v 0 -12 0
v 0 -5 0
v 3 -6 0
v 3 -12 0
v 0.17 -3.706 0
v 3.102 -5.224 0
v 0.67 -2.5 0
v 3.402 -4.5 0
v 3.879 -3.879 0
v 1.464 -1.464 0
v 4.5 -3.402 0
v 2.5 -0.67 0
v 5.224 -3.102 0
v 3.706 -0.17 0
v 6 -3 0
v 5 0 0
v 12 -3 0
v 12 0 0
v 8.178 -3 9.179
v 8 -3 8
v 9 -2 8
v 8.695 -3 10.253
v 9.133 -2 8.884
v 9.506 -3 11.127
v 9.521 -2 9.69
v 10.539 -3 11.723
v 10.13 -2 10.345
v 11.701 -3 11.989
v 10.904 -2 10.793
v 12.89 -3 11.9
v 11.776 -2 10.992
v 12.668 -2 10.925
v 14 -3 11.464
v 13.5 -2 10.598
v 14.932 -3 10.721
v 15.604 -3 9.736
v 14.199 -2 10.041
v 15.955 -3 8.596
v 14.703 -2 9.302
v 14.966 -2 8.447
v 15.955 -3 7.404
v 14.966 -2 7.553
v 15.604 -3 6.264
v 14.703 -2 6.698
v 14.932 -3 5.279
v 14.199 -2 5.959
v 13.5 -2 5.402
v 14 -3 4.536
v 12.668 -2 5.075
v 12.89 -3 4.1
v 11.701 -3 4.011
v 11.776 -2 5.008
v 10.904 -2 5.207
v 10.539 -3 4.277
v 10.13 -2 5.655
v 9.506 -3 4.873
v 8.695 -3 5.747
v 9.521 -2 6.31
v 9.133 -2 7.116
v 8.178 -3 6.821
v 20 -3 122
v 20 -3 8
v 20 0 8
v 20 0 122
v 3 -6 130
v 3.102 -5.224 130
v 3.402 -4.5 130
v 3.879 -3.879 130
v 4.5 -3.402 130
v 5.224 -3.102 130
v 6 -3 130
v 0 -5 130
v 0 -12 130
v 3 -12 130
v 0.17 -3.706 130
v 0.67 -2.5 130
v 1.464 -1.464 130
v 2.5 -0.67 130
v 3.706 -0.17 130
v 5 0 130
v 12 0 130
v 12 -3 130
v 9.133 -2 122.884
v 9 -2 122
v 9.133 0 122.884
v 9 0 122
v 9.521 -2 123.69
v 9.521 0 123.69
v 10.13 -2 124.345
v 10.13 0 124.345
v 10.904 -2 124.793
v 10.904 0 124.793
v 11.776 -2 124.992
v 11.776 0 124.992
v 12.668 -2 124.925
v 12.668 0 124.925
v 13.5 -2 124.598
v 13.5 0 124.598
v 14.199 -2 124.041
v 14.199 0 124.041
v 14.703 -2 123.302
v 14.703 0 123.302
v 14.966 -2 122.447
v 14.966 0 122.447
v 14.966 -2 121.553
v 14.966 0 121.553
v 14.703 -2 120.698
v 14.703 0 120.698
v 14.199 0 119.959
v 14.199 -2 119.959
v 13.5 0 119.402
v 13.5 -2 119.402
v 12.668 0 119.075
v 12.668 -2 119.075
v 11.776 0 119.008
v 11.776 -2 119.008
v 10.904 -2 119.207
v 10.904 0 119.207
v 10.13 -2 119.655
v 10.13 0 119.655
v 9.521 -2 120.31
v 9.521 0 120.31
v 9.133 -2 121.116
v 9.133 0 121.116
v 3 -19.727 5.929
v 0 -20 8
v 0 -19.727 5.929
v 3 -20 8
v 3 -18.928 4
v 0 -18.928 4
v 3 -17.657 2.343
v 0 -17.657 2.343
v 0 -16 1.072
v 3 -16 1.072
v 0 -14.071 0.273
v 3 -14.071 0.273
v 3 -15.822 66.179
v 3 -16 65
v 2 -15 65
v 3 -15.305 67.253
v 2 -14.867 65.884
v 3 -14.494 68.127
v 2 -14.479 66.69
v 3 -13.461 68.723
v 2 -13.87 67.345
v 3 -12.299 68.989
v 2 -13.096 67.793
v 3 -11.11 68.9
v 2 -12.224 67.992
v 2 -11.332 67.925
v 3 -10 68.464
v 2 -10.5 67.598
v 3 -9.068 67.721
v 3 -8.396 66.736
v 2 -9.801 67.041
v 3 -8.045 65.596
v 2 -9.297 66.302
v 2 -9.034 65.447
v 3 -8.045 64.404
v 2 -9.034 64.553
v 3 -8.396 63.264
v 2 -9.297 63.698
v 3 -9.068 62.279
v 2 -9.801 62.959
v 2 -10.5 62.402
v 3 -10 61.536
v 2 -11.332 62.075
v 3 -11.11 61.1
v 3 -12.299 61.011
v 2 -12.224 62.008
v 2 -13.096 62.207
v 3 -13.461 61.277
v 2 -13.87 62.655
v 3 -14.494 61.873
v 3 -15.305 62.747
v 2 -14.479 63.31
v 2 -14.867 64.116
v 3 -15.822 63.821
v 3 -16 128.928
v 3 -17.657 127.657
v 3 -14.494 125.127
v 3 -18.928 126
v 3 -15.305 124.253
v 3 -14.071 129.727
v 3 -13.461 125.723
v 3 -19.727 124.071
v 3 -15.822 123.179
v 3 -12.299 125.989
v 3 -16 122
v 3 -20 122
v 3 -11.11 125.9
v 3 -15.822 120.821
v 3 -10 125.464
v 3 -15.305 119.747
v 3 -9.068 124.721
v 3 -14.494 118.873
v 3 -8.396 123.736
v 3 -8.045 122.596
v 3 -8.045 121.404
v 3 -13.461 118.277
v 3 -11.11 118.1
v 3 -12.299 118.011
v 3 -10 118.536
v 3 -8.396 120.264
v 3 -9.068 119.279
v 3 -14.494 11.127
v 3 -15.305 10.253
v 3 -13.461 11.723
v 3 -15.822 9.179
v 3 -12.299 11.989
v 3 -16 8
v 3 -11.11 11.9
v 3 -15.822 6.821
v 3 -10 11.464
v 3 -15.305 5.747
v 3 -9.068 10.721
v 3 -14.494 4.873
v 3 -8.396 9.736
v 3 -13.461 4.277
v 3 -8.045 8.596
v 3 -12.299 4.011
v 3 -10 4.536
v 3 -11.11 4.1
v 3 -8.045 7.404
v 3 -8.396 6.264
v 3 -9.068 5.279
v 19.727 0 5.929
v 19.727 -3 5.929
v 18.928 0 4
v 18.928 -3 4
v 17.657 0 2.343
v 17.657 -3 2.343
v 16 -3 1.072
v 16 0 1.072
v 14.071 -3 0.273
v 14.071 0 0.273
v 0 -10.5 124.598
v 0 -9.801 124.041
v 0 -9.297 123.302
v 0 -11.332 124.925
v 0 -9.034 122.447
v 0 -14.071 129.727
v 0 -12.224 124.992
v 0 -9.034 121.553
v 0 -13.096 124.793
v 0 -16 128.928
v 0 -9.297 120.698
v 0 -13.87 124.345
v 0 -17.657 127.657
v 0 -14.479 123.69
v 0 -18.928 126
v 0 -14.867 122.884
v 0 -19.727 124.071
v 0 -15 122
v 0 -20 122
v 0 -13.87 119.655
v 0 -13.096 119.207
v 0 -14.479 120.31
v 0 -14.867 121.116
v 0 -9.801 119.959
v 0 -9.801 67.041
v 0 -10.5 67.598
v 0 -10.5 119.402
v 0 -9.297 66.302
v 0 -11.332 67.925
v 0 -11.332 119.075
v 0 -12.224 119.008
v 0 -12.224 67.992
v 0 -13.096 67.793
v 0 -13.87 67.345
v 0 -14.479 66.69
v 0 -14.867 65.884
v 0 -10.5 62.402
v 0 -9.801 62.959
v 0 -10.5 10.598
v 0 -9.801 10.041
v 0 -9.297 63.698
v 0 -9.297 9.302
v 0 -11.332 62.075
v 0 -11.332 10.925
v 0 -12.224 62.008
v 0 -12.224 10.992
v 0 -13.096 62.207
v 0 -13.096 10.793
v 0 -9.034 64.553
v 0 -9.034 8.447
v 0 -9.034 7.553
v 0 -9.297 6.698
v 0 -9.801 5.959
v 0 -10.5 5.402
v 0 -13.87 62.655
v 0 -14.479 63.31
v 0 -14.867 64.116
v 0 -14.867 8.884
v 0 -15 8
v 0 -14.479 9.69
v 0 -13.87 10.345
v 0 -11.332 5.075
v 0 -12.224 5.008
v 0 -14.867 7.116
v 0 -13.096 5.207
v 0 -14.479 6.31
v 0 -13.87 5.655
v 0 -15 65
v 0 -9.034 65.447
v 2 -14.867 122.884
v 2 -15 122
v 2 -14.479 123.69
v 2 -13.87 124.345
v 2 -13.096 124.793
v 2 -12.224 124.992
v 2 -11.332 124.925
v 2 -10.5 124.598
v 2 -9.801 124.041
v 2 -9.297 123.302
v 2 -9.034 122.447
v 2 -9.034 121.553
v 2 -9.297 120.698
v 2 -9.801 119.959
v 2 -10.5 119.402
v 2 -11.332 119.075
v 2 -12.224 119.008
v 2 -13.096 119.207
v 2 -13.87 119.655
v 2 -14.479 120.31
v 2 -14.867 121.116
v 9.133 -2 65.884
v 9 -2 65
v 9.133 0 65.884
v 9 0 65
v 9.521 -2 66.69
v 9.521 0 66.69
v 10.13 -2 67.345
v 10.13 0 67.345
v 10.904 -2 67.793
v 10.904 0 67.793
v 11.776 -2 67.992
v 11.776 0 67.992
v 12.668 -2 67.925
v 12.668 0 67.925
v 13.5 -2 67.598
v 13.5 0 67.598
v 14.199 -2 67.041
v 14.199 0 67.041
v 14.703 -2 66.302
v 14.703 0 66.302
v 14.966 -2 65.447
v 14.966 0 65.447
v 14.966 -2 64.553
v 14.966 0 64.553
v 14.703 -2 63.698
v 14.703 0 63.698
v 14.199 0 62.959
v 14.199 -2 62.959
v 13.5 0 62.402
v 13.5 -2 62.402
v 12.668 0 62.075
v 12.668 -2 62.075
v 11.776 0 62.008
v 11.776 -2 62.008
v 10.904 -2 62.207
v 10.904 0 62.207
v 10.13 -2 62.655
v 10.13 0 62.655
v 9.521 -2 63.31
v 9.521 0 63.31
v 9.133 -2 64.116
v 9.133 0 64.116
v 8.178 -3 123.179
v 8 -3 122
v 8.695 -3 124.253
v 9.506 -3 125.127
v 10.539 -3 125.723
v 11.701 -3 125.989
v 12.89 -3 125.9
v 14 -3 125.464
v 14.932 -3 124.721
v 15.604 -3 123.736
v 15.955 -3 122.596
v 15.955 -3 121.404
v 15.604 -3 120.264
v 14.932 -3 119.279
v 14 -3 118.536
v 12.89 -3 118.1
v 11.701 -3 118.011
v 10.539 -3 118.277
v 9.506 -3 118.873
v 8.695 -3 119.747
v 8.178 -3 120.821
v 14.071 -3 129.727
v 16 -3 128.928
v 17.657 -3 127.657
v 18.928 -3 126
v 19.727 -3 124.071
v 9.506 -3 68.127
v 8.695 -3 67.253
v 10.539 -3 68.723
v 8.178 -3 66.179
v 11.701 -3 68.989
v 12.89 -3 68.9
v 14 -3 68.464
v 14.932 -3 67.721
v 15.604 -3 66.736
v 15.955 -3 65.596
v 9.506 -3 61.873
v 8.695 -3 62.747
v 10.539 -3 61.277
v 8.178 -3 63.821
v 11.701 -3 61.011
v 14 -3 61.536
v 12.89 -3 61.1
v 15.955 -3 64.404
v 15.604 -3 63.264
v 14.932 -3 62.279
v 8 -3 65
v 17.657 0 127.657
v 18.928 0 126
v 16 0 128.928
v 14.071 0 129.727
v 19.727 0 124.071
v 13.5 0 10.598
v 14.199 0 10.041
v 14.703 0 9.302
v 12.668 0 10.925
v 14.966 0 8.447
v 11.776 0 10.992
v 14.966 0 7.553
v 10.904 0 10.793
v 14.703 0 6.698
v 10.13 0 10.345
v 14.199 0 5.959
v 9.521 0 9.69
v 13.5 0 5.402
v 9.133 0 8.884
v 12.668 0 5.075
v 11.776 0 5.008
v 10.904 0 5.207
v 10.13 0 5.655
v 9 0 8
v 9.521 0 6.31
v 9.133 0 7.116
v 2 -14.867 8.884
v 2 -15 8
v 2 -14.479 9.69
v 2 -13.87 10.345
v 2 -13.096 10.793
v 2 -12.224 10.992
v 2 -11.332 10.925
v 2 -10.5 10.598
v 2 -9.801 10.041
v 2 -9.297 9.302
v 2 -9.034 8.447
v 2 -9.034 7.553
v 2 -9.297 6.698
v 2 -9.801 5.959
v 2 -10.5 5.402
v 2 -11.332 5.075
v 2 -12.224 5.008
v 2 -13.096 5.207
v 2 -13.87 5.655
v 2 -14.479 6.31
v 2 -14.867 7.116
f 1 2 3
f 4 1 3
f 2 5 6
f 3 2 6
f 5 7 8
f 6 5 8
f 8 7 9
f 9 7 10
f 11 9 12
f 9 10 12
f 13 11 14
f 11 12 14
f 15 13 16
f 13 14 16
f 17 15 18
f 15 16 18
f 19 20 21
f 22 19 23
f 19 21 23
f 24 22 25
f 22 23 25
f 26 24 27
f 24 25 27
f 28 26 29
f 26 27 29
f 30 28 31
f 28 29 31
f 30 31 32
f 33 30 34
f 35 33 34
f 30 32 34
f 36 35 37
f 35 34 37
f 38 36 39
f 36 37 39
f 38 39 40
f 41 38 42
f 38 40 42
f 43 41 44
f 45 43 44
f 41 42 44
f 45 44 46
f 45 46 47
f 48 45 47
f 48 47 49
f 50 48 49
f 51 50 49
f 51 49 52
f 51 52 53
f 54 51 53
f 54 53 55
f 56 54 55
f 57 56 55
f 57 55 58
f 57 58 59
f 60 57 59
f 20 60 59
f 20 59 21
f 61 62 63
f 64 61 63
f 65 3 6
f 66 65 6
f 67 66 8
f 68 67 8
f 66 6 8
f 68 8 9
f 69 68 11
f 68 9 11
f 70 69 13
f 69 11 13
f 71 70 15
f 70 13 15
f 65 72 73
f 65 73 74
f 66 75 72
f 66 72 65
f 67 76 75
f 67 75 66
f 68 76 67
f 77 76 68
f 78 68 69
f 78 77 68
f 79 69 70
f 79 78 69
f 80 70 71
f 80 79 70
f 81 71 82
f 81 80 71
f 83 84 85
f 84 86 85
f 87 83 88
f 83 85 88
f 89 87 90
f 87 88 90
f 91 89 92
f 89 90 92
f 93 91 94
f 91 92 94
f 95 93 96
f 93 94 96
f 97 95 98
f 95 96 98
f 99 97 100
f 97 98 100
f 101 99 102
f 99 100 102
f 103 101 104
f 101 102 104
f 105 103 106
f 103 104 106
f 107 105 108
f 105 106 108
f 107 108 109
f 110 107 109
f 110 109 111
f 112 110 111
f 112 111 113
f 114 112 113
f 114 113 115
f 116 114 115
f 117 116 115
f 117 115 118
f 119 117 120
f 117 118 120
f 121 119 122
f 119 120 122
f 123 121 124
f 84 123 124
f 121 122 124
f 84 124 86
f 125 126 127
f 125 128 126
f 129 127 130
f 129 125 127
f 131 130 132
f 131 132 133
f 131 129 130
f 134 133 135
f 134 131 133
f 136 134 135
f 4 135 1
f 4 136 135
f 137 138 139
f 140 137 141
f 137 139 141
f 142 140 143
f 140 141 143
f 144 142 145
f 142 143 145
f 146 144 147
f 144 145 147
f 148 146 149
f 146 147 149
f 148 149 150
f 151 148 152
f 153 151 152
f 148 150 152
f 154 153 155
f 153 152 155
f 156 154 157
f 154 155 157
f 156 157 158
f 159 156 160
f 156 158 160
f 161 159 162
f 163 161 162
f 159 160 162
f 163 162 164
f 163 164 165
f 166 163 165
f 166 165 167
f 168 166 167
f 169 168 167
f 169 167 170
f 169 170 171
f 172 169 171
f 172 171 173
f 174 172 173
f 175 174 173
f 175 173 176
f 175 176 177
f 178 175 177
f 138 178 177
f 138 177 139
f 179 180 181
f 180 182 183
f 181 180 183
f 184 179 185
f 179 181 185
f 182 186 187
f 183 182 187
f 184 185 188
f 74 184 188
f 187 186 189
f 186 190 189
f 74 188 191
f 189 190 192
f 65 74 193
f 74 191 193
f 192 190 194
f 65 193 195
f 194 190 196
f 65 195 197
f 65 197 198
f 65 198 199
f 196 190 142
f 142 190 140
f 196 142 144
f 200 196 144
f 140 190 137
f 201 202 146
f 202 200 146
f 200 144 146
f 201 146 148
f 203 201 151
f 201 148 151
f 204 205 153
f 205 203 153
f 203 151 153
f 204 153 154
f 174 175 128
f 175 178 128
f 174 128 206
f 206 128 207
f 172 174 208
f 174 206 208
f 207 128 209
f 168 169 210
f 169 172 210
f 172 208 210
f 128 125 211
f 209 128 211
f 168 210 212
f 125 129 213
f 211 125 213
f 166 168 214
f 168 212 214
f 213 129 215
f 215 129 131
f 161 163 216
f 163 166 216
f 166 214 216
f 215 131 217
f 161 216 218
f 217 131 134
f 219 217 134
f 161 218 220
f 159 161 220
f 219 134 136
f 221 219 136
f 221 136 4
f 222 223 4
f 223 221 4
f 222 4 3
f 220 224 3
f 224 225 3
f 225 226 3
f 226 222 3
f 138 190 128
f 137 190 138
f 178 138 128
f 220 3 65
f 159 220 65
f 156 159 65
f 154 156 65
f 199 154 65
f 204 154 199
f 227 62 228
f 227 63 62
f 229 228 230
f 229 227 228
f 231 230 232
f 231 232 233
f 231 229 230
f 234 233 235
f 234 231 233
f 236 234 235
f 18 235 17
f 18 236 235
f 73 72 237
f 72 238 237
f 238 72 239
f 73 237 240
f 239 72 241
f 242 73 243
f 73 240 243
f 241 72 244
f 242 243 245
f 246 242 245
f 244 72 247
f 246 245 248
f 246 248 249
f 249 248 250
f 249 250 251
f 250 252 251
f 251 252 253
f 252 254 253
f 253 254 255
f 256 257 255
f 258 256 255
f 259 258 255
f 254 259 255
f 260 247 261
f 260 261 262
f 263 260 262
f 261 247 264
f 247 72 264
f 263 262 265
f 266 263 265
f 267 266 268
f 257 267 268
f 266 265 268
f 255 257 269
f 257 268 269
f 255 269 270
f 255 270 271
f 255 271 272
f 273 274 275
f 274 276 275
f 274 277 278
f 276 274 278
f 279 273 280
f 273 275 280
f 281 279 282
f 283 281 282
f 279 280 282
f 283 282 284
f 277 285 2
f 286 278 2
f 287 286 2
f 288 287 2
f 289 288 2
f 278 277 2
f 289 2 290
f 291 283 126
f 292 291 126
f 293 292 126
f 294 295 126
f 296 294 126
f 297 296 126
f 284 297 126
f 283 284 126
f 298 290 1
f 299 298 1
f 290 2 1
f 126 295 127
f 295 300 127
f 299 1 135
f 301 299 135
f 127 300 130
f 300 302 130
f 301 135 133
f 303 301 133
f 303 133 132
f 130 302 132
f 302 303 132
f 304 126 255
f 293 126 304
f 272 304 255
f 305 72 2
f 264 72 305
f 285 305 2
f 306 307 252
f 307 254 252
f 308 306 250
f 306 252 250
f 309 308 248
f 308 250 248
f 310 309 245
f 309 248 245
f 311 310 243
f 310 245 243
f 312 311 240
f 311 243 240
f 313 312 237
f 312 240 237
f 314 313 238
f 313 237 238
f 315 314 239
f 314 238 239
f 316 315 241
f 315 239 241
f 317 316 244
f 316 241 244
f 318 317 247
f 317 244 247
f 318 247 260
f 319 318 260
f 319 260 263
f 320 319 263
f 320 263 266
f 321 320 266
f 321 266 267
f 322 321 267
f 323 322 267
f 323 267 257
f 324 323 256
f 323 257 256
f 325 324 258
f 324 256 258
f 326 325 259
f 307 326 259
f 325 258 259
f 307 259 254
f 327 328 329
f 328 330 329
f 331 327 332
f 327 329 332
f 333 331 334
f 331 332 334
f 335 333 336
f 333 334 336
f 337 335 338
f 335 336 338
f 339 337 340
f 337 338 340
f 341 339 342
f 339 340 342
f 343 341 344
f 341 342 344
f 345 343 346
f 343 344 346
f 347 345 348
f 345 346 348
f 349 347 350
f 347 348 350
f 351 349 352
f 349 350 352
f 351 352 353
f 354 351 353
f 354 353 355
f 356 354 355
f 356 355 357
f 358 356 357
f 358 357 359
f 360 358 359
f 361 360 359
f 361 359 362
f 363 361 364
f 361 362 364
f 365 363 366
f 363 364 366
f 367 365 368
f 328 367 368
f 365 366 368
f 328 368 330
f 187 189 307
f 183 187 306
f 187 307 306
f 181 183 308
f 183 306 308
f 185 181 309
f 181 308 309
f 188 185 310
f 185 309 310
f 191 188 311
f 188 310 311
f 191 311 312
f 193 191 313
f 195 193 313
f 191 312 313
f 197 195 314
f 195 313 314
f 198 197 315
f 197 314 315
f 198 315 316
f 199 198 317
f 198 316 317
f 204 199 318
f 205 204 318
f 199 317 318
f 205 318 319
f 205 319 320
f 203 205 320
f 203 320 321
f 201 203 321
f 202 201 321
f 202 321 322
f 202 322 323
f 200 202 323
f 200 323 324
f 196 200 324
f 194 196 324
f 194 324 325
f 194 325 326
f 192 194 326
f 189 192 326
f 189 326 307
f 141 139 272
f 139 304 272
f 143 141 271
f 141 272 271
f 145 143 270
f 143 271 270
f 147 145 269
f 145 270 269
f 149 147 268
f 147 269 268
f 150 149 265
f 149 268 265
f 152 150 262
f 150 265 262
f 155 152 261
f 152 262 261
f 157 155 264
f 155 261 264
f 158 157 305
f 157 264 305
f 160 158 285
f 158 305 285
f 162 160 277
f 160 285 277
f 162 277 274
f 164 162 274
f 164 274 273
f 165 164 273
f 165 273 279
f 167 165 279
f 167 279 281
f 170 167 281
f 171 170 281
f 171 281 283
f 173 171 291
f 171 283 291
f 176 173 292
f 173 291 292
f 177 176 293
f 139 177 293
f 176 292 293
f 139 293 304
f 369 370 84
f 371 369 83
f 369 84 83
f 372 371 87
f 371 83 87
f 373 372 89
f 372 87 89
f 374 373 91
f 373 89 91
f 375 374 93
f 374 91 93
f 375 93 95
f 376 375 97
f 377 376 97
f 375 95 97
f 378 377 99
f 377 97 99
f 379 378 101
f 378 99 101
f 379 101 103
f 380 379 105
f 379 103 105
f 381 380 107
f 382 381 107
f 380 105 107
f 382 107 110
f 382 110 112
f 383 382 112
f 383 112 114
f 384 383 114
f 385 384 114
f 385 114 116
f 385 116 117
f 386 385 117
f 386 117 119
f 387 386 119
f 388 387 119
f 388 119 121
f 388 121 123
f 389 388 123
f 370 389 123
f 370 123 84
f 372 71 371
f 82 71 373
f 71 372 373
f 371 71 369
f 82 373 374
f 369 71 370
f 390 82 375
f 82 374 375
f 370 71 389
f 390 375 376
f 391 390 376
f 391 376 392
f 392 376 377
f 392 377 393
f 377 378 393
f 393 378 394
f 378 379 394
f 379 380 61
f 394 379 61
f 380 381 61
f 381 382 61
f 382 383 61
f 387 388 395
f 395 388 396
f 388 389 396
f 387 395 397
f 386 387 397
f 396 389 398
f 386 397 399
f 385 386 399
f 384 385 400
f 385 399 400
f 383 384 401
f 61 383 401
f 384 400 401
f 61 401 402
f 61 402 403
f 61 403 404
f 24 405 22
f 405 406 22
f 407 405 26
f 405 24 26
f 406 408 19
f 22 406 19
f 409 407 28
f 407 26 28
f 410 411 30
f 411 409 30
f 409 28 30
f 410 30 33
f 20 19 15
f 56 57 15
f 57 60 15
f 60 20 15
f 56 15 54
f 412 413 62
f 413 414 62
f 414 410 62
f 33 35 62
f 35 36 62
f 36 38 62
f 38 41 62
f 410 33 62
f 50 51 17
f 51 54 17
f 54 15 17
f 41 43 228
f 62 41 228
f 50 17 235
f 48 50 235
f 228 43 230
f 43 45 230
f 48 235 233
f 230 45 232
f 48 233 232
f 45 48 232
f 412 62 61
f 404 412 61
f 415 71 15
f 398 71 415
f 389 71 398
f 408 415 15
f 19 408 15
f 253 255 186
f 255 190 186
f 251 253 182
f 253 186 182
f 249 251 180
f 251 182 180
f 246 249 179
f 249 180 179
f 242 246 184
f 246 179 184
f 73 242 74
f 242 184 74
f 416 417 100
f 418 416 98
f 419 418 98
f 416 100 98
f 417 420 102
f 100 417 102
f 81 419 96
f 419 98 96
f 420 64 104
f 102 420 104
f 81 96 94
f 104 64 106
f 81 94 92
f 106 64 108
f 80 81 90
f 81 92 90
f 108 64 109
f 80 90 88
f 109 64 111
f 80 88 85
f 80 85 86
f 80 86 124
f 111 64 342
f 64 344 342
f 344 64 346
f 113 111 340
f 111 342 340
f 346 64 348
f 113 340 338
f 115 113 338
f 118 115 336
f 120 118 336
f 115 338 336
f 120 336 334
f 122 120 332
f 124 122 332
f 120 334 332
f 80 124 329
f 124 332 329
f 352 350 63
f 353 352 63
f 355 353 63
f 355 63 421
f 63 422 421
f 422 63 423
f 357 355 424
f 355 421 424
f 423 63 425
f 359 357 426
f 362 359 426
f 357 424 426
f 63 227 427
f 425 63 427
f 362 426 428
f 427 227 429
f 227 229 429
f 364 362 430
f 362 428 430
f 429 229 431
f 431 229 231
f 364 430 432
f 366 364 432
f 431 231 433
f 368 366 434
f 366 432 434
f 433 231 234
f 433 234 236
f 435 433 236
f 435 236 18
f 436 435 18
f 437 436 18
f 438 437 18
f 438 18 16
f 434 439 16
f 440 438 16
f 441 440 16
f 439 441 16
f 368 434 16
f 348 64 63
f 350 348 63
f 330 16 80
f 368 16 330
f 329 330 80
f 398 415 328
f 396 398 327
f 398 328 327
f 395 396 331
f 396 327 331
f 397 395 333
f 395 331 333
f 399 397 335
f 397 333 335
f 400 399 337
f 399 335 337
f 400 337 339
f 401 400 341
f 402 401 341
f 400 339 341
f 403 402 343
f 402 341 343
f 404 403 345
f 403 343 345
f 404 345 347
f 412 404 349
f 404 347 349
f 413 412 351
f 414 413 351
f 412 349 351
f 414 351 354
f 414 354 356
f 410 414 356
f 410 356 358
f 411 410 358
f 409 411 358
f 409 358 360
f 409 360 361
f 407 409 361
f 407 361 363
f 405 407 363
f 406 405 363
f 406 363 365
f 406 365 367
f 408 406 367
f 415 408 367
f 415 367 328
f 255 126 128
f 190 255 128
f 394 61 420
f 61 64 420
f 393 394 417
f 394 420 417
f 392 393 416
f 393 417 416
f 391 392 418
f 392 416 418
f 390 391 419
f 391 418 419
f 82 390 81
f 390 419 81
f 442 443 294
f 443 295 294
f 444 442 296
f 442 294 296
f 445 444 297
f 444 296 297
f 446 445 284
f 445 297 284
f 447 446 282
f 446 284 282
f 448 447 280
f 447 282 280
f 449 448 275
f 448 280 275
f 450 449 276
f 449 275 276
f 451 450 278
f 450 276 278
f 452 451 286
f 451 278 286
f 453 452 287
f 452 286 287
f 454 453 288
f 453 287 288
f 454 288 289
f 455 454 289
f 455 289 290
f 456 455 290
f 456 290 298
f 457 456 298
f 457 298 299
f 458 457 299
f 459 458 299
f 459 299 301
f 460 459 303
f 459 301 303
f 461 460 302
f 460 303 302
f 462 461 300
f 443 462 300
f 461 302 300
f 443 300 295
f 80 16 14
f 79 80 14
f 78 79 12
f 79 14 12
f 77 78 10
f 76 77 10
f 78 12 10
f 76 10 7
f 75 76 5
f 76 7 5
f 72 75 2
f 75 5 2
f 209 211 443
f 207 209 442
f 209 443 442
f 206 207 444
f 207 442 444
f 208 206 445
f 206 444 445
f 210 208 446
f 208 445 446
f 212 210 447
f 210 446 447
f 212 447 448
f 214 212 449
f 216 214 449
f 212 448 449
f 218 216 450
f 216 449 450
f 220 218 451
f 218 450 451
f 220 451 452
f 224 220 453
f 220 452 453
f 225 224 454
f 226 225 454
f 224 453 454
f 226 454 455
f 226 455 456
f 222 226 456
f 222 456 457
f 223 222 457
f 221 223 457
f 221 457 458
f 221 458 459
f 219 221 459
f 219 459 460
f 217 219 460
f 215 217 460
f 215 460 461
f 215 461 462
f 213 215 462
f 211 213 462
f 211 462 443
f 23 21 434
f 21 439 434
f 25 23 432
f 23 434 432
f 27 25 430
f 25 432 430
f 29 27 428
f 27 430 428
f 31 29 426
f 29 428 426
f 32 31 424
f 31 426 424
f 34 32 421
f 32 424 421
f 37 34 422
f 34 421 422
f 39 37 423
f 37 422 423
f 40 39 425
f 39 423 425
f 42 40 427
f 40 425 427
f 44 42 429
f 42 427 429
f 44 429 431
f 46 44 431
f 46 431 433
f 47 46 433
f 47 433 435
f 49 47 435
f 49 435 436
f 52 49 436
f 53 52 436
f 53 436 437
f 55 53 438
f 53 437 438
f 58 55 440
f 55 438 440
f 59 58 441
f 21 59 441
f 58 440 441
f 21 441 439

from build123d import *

# Parameters (mm, degrees)
F1_DEPTH       = 130
F2_R           = 8
F4_D           = 6
F4_CSINK_D     = 8
F4_CSINK_ANGLE = 90
F6_D           = 6
F6_CSINK_D     = 8
F6_CSINK_ANGLE = 90


with BuildPart() as f1:
    # F0 (on Top) → F1 (new body)
    with BuildSketch(Plane.XY):
        with BuildLine():
            Line((20, -3), (20, 0))
            Line((20, 0), (5, 0))
            ThreePointArc((5, 0), (1.4644660941, -1.4644660941), (0, -5))
            Line((0, -5), (0, -20))
            Line((0, -20), (3, -20))
            Line((3, -20), (3, -6))
            ThreePointArc((3, -6), (3.8786796564, -3.8786796564), (6, -3))
            Line((6, -3), (20, -3))
        make_face()
    extrude(amount=F1_DEPTH)

    # F2
    f2_edges = [f1.edges().sort_by_distance(p)[0] for p in [
        (20, -1.5, 130),
        (20, -1.5, 0),
        (1.5, -20, 0),
        (1.5, -20, 130),
    ]]
    fillet(f2_edges, radius=F2_R)

    # F4 (through all)
    with Locations(Plane.XZ.offset(3)):
        with Locations((12, 122), (12, 65), (12, 8)):
            CounterSinkHole(F4_D / 2, F4_CSINK_D / 2, counter_sink_angle=F4_CSINK_ANGLE)

    # F6 (through all)
    with Locations(Plane.YZ.offset(3)):
        with Locations((-12, 122), (-12, 65), (-12, 8)):
            CounterSinkHole(F6_D / 2, F6_CSINK_D / 2, counter_sink_angle=F6_CSINK_ANGLE)


solid = f1.part
